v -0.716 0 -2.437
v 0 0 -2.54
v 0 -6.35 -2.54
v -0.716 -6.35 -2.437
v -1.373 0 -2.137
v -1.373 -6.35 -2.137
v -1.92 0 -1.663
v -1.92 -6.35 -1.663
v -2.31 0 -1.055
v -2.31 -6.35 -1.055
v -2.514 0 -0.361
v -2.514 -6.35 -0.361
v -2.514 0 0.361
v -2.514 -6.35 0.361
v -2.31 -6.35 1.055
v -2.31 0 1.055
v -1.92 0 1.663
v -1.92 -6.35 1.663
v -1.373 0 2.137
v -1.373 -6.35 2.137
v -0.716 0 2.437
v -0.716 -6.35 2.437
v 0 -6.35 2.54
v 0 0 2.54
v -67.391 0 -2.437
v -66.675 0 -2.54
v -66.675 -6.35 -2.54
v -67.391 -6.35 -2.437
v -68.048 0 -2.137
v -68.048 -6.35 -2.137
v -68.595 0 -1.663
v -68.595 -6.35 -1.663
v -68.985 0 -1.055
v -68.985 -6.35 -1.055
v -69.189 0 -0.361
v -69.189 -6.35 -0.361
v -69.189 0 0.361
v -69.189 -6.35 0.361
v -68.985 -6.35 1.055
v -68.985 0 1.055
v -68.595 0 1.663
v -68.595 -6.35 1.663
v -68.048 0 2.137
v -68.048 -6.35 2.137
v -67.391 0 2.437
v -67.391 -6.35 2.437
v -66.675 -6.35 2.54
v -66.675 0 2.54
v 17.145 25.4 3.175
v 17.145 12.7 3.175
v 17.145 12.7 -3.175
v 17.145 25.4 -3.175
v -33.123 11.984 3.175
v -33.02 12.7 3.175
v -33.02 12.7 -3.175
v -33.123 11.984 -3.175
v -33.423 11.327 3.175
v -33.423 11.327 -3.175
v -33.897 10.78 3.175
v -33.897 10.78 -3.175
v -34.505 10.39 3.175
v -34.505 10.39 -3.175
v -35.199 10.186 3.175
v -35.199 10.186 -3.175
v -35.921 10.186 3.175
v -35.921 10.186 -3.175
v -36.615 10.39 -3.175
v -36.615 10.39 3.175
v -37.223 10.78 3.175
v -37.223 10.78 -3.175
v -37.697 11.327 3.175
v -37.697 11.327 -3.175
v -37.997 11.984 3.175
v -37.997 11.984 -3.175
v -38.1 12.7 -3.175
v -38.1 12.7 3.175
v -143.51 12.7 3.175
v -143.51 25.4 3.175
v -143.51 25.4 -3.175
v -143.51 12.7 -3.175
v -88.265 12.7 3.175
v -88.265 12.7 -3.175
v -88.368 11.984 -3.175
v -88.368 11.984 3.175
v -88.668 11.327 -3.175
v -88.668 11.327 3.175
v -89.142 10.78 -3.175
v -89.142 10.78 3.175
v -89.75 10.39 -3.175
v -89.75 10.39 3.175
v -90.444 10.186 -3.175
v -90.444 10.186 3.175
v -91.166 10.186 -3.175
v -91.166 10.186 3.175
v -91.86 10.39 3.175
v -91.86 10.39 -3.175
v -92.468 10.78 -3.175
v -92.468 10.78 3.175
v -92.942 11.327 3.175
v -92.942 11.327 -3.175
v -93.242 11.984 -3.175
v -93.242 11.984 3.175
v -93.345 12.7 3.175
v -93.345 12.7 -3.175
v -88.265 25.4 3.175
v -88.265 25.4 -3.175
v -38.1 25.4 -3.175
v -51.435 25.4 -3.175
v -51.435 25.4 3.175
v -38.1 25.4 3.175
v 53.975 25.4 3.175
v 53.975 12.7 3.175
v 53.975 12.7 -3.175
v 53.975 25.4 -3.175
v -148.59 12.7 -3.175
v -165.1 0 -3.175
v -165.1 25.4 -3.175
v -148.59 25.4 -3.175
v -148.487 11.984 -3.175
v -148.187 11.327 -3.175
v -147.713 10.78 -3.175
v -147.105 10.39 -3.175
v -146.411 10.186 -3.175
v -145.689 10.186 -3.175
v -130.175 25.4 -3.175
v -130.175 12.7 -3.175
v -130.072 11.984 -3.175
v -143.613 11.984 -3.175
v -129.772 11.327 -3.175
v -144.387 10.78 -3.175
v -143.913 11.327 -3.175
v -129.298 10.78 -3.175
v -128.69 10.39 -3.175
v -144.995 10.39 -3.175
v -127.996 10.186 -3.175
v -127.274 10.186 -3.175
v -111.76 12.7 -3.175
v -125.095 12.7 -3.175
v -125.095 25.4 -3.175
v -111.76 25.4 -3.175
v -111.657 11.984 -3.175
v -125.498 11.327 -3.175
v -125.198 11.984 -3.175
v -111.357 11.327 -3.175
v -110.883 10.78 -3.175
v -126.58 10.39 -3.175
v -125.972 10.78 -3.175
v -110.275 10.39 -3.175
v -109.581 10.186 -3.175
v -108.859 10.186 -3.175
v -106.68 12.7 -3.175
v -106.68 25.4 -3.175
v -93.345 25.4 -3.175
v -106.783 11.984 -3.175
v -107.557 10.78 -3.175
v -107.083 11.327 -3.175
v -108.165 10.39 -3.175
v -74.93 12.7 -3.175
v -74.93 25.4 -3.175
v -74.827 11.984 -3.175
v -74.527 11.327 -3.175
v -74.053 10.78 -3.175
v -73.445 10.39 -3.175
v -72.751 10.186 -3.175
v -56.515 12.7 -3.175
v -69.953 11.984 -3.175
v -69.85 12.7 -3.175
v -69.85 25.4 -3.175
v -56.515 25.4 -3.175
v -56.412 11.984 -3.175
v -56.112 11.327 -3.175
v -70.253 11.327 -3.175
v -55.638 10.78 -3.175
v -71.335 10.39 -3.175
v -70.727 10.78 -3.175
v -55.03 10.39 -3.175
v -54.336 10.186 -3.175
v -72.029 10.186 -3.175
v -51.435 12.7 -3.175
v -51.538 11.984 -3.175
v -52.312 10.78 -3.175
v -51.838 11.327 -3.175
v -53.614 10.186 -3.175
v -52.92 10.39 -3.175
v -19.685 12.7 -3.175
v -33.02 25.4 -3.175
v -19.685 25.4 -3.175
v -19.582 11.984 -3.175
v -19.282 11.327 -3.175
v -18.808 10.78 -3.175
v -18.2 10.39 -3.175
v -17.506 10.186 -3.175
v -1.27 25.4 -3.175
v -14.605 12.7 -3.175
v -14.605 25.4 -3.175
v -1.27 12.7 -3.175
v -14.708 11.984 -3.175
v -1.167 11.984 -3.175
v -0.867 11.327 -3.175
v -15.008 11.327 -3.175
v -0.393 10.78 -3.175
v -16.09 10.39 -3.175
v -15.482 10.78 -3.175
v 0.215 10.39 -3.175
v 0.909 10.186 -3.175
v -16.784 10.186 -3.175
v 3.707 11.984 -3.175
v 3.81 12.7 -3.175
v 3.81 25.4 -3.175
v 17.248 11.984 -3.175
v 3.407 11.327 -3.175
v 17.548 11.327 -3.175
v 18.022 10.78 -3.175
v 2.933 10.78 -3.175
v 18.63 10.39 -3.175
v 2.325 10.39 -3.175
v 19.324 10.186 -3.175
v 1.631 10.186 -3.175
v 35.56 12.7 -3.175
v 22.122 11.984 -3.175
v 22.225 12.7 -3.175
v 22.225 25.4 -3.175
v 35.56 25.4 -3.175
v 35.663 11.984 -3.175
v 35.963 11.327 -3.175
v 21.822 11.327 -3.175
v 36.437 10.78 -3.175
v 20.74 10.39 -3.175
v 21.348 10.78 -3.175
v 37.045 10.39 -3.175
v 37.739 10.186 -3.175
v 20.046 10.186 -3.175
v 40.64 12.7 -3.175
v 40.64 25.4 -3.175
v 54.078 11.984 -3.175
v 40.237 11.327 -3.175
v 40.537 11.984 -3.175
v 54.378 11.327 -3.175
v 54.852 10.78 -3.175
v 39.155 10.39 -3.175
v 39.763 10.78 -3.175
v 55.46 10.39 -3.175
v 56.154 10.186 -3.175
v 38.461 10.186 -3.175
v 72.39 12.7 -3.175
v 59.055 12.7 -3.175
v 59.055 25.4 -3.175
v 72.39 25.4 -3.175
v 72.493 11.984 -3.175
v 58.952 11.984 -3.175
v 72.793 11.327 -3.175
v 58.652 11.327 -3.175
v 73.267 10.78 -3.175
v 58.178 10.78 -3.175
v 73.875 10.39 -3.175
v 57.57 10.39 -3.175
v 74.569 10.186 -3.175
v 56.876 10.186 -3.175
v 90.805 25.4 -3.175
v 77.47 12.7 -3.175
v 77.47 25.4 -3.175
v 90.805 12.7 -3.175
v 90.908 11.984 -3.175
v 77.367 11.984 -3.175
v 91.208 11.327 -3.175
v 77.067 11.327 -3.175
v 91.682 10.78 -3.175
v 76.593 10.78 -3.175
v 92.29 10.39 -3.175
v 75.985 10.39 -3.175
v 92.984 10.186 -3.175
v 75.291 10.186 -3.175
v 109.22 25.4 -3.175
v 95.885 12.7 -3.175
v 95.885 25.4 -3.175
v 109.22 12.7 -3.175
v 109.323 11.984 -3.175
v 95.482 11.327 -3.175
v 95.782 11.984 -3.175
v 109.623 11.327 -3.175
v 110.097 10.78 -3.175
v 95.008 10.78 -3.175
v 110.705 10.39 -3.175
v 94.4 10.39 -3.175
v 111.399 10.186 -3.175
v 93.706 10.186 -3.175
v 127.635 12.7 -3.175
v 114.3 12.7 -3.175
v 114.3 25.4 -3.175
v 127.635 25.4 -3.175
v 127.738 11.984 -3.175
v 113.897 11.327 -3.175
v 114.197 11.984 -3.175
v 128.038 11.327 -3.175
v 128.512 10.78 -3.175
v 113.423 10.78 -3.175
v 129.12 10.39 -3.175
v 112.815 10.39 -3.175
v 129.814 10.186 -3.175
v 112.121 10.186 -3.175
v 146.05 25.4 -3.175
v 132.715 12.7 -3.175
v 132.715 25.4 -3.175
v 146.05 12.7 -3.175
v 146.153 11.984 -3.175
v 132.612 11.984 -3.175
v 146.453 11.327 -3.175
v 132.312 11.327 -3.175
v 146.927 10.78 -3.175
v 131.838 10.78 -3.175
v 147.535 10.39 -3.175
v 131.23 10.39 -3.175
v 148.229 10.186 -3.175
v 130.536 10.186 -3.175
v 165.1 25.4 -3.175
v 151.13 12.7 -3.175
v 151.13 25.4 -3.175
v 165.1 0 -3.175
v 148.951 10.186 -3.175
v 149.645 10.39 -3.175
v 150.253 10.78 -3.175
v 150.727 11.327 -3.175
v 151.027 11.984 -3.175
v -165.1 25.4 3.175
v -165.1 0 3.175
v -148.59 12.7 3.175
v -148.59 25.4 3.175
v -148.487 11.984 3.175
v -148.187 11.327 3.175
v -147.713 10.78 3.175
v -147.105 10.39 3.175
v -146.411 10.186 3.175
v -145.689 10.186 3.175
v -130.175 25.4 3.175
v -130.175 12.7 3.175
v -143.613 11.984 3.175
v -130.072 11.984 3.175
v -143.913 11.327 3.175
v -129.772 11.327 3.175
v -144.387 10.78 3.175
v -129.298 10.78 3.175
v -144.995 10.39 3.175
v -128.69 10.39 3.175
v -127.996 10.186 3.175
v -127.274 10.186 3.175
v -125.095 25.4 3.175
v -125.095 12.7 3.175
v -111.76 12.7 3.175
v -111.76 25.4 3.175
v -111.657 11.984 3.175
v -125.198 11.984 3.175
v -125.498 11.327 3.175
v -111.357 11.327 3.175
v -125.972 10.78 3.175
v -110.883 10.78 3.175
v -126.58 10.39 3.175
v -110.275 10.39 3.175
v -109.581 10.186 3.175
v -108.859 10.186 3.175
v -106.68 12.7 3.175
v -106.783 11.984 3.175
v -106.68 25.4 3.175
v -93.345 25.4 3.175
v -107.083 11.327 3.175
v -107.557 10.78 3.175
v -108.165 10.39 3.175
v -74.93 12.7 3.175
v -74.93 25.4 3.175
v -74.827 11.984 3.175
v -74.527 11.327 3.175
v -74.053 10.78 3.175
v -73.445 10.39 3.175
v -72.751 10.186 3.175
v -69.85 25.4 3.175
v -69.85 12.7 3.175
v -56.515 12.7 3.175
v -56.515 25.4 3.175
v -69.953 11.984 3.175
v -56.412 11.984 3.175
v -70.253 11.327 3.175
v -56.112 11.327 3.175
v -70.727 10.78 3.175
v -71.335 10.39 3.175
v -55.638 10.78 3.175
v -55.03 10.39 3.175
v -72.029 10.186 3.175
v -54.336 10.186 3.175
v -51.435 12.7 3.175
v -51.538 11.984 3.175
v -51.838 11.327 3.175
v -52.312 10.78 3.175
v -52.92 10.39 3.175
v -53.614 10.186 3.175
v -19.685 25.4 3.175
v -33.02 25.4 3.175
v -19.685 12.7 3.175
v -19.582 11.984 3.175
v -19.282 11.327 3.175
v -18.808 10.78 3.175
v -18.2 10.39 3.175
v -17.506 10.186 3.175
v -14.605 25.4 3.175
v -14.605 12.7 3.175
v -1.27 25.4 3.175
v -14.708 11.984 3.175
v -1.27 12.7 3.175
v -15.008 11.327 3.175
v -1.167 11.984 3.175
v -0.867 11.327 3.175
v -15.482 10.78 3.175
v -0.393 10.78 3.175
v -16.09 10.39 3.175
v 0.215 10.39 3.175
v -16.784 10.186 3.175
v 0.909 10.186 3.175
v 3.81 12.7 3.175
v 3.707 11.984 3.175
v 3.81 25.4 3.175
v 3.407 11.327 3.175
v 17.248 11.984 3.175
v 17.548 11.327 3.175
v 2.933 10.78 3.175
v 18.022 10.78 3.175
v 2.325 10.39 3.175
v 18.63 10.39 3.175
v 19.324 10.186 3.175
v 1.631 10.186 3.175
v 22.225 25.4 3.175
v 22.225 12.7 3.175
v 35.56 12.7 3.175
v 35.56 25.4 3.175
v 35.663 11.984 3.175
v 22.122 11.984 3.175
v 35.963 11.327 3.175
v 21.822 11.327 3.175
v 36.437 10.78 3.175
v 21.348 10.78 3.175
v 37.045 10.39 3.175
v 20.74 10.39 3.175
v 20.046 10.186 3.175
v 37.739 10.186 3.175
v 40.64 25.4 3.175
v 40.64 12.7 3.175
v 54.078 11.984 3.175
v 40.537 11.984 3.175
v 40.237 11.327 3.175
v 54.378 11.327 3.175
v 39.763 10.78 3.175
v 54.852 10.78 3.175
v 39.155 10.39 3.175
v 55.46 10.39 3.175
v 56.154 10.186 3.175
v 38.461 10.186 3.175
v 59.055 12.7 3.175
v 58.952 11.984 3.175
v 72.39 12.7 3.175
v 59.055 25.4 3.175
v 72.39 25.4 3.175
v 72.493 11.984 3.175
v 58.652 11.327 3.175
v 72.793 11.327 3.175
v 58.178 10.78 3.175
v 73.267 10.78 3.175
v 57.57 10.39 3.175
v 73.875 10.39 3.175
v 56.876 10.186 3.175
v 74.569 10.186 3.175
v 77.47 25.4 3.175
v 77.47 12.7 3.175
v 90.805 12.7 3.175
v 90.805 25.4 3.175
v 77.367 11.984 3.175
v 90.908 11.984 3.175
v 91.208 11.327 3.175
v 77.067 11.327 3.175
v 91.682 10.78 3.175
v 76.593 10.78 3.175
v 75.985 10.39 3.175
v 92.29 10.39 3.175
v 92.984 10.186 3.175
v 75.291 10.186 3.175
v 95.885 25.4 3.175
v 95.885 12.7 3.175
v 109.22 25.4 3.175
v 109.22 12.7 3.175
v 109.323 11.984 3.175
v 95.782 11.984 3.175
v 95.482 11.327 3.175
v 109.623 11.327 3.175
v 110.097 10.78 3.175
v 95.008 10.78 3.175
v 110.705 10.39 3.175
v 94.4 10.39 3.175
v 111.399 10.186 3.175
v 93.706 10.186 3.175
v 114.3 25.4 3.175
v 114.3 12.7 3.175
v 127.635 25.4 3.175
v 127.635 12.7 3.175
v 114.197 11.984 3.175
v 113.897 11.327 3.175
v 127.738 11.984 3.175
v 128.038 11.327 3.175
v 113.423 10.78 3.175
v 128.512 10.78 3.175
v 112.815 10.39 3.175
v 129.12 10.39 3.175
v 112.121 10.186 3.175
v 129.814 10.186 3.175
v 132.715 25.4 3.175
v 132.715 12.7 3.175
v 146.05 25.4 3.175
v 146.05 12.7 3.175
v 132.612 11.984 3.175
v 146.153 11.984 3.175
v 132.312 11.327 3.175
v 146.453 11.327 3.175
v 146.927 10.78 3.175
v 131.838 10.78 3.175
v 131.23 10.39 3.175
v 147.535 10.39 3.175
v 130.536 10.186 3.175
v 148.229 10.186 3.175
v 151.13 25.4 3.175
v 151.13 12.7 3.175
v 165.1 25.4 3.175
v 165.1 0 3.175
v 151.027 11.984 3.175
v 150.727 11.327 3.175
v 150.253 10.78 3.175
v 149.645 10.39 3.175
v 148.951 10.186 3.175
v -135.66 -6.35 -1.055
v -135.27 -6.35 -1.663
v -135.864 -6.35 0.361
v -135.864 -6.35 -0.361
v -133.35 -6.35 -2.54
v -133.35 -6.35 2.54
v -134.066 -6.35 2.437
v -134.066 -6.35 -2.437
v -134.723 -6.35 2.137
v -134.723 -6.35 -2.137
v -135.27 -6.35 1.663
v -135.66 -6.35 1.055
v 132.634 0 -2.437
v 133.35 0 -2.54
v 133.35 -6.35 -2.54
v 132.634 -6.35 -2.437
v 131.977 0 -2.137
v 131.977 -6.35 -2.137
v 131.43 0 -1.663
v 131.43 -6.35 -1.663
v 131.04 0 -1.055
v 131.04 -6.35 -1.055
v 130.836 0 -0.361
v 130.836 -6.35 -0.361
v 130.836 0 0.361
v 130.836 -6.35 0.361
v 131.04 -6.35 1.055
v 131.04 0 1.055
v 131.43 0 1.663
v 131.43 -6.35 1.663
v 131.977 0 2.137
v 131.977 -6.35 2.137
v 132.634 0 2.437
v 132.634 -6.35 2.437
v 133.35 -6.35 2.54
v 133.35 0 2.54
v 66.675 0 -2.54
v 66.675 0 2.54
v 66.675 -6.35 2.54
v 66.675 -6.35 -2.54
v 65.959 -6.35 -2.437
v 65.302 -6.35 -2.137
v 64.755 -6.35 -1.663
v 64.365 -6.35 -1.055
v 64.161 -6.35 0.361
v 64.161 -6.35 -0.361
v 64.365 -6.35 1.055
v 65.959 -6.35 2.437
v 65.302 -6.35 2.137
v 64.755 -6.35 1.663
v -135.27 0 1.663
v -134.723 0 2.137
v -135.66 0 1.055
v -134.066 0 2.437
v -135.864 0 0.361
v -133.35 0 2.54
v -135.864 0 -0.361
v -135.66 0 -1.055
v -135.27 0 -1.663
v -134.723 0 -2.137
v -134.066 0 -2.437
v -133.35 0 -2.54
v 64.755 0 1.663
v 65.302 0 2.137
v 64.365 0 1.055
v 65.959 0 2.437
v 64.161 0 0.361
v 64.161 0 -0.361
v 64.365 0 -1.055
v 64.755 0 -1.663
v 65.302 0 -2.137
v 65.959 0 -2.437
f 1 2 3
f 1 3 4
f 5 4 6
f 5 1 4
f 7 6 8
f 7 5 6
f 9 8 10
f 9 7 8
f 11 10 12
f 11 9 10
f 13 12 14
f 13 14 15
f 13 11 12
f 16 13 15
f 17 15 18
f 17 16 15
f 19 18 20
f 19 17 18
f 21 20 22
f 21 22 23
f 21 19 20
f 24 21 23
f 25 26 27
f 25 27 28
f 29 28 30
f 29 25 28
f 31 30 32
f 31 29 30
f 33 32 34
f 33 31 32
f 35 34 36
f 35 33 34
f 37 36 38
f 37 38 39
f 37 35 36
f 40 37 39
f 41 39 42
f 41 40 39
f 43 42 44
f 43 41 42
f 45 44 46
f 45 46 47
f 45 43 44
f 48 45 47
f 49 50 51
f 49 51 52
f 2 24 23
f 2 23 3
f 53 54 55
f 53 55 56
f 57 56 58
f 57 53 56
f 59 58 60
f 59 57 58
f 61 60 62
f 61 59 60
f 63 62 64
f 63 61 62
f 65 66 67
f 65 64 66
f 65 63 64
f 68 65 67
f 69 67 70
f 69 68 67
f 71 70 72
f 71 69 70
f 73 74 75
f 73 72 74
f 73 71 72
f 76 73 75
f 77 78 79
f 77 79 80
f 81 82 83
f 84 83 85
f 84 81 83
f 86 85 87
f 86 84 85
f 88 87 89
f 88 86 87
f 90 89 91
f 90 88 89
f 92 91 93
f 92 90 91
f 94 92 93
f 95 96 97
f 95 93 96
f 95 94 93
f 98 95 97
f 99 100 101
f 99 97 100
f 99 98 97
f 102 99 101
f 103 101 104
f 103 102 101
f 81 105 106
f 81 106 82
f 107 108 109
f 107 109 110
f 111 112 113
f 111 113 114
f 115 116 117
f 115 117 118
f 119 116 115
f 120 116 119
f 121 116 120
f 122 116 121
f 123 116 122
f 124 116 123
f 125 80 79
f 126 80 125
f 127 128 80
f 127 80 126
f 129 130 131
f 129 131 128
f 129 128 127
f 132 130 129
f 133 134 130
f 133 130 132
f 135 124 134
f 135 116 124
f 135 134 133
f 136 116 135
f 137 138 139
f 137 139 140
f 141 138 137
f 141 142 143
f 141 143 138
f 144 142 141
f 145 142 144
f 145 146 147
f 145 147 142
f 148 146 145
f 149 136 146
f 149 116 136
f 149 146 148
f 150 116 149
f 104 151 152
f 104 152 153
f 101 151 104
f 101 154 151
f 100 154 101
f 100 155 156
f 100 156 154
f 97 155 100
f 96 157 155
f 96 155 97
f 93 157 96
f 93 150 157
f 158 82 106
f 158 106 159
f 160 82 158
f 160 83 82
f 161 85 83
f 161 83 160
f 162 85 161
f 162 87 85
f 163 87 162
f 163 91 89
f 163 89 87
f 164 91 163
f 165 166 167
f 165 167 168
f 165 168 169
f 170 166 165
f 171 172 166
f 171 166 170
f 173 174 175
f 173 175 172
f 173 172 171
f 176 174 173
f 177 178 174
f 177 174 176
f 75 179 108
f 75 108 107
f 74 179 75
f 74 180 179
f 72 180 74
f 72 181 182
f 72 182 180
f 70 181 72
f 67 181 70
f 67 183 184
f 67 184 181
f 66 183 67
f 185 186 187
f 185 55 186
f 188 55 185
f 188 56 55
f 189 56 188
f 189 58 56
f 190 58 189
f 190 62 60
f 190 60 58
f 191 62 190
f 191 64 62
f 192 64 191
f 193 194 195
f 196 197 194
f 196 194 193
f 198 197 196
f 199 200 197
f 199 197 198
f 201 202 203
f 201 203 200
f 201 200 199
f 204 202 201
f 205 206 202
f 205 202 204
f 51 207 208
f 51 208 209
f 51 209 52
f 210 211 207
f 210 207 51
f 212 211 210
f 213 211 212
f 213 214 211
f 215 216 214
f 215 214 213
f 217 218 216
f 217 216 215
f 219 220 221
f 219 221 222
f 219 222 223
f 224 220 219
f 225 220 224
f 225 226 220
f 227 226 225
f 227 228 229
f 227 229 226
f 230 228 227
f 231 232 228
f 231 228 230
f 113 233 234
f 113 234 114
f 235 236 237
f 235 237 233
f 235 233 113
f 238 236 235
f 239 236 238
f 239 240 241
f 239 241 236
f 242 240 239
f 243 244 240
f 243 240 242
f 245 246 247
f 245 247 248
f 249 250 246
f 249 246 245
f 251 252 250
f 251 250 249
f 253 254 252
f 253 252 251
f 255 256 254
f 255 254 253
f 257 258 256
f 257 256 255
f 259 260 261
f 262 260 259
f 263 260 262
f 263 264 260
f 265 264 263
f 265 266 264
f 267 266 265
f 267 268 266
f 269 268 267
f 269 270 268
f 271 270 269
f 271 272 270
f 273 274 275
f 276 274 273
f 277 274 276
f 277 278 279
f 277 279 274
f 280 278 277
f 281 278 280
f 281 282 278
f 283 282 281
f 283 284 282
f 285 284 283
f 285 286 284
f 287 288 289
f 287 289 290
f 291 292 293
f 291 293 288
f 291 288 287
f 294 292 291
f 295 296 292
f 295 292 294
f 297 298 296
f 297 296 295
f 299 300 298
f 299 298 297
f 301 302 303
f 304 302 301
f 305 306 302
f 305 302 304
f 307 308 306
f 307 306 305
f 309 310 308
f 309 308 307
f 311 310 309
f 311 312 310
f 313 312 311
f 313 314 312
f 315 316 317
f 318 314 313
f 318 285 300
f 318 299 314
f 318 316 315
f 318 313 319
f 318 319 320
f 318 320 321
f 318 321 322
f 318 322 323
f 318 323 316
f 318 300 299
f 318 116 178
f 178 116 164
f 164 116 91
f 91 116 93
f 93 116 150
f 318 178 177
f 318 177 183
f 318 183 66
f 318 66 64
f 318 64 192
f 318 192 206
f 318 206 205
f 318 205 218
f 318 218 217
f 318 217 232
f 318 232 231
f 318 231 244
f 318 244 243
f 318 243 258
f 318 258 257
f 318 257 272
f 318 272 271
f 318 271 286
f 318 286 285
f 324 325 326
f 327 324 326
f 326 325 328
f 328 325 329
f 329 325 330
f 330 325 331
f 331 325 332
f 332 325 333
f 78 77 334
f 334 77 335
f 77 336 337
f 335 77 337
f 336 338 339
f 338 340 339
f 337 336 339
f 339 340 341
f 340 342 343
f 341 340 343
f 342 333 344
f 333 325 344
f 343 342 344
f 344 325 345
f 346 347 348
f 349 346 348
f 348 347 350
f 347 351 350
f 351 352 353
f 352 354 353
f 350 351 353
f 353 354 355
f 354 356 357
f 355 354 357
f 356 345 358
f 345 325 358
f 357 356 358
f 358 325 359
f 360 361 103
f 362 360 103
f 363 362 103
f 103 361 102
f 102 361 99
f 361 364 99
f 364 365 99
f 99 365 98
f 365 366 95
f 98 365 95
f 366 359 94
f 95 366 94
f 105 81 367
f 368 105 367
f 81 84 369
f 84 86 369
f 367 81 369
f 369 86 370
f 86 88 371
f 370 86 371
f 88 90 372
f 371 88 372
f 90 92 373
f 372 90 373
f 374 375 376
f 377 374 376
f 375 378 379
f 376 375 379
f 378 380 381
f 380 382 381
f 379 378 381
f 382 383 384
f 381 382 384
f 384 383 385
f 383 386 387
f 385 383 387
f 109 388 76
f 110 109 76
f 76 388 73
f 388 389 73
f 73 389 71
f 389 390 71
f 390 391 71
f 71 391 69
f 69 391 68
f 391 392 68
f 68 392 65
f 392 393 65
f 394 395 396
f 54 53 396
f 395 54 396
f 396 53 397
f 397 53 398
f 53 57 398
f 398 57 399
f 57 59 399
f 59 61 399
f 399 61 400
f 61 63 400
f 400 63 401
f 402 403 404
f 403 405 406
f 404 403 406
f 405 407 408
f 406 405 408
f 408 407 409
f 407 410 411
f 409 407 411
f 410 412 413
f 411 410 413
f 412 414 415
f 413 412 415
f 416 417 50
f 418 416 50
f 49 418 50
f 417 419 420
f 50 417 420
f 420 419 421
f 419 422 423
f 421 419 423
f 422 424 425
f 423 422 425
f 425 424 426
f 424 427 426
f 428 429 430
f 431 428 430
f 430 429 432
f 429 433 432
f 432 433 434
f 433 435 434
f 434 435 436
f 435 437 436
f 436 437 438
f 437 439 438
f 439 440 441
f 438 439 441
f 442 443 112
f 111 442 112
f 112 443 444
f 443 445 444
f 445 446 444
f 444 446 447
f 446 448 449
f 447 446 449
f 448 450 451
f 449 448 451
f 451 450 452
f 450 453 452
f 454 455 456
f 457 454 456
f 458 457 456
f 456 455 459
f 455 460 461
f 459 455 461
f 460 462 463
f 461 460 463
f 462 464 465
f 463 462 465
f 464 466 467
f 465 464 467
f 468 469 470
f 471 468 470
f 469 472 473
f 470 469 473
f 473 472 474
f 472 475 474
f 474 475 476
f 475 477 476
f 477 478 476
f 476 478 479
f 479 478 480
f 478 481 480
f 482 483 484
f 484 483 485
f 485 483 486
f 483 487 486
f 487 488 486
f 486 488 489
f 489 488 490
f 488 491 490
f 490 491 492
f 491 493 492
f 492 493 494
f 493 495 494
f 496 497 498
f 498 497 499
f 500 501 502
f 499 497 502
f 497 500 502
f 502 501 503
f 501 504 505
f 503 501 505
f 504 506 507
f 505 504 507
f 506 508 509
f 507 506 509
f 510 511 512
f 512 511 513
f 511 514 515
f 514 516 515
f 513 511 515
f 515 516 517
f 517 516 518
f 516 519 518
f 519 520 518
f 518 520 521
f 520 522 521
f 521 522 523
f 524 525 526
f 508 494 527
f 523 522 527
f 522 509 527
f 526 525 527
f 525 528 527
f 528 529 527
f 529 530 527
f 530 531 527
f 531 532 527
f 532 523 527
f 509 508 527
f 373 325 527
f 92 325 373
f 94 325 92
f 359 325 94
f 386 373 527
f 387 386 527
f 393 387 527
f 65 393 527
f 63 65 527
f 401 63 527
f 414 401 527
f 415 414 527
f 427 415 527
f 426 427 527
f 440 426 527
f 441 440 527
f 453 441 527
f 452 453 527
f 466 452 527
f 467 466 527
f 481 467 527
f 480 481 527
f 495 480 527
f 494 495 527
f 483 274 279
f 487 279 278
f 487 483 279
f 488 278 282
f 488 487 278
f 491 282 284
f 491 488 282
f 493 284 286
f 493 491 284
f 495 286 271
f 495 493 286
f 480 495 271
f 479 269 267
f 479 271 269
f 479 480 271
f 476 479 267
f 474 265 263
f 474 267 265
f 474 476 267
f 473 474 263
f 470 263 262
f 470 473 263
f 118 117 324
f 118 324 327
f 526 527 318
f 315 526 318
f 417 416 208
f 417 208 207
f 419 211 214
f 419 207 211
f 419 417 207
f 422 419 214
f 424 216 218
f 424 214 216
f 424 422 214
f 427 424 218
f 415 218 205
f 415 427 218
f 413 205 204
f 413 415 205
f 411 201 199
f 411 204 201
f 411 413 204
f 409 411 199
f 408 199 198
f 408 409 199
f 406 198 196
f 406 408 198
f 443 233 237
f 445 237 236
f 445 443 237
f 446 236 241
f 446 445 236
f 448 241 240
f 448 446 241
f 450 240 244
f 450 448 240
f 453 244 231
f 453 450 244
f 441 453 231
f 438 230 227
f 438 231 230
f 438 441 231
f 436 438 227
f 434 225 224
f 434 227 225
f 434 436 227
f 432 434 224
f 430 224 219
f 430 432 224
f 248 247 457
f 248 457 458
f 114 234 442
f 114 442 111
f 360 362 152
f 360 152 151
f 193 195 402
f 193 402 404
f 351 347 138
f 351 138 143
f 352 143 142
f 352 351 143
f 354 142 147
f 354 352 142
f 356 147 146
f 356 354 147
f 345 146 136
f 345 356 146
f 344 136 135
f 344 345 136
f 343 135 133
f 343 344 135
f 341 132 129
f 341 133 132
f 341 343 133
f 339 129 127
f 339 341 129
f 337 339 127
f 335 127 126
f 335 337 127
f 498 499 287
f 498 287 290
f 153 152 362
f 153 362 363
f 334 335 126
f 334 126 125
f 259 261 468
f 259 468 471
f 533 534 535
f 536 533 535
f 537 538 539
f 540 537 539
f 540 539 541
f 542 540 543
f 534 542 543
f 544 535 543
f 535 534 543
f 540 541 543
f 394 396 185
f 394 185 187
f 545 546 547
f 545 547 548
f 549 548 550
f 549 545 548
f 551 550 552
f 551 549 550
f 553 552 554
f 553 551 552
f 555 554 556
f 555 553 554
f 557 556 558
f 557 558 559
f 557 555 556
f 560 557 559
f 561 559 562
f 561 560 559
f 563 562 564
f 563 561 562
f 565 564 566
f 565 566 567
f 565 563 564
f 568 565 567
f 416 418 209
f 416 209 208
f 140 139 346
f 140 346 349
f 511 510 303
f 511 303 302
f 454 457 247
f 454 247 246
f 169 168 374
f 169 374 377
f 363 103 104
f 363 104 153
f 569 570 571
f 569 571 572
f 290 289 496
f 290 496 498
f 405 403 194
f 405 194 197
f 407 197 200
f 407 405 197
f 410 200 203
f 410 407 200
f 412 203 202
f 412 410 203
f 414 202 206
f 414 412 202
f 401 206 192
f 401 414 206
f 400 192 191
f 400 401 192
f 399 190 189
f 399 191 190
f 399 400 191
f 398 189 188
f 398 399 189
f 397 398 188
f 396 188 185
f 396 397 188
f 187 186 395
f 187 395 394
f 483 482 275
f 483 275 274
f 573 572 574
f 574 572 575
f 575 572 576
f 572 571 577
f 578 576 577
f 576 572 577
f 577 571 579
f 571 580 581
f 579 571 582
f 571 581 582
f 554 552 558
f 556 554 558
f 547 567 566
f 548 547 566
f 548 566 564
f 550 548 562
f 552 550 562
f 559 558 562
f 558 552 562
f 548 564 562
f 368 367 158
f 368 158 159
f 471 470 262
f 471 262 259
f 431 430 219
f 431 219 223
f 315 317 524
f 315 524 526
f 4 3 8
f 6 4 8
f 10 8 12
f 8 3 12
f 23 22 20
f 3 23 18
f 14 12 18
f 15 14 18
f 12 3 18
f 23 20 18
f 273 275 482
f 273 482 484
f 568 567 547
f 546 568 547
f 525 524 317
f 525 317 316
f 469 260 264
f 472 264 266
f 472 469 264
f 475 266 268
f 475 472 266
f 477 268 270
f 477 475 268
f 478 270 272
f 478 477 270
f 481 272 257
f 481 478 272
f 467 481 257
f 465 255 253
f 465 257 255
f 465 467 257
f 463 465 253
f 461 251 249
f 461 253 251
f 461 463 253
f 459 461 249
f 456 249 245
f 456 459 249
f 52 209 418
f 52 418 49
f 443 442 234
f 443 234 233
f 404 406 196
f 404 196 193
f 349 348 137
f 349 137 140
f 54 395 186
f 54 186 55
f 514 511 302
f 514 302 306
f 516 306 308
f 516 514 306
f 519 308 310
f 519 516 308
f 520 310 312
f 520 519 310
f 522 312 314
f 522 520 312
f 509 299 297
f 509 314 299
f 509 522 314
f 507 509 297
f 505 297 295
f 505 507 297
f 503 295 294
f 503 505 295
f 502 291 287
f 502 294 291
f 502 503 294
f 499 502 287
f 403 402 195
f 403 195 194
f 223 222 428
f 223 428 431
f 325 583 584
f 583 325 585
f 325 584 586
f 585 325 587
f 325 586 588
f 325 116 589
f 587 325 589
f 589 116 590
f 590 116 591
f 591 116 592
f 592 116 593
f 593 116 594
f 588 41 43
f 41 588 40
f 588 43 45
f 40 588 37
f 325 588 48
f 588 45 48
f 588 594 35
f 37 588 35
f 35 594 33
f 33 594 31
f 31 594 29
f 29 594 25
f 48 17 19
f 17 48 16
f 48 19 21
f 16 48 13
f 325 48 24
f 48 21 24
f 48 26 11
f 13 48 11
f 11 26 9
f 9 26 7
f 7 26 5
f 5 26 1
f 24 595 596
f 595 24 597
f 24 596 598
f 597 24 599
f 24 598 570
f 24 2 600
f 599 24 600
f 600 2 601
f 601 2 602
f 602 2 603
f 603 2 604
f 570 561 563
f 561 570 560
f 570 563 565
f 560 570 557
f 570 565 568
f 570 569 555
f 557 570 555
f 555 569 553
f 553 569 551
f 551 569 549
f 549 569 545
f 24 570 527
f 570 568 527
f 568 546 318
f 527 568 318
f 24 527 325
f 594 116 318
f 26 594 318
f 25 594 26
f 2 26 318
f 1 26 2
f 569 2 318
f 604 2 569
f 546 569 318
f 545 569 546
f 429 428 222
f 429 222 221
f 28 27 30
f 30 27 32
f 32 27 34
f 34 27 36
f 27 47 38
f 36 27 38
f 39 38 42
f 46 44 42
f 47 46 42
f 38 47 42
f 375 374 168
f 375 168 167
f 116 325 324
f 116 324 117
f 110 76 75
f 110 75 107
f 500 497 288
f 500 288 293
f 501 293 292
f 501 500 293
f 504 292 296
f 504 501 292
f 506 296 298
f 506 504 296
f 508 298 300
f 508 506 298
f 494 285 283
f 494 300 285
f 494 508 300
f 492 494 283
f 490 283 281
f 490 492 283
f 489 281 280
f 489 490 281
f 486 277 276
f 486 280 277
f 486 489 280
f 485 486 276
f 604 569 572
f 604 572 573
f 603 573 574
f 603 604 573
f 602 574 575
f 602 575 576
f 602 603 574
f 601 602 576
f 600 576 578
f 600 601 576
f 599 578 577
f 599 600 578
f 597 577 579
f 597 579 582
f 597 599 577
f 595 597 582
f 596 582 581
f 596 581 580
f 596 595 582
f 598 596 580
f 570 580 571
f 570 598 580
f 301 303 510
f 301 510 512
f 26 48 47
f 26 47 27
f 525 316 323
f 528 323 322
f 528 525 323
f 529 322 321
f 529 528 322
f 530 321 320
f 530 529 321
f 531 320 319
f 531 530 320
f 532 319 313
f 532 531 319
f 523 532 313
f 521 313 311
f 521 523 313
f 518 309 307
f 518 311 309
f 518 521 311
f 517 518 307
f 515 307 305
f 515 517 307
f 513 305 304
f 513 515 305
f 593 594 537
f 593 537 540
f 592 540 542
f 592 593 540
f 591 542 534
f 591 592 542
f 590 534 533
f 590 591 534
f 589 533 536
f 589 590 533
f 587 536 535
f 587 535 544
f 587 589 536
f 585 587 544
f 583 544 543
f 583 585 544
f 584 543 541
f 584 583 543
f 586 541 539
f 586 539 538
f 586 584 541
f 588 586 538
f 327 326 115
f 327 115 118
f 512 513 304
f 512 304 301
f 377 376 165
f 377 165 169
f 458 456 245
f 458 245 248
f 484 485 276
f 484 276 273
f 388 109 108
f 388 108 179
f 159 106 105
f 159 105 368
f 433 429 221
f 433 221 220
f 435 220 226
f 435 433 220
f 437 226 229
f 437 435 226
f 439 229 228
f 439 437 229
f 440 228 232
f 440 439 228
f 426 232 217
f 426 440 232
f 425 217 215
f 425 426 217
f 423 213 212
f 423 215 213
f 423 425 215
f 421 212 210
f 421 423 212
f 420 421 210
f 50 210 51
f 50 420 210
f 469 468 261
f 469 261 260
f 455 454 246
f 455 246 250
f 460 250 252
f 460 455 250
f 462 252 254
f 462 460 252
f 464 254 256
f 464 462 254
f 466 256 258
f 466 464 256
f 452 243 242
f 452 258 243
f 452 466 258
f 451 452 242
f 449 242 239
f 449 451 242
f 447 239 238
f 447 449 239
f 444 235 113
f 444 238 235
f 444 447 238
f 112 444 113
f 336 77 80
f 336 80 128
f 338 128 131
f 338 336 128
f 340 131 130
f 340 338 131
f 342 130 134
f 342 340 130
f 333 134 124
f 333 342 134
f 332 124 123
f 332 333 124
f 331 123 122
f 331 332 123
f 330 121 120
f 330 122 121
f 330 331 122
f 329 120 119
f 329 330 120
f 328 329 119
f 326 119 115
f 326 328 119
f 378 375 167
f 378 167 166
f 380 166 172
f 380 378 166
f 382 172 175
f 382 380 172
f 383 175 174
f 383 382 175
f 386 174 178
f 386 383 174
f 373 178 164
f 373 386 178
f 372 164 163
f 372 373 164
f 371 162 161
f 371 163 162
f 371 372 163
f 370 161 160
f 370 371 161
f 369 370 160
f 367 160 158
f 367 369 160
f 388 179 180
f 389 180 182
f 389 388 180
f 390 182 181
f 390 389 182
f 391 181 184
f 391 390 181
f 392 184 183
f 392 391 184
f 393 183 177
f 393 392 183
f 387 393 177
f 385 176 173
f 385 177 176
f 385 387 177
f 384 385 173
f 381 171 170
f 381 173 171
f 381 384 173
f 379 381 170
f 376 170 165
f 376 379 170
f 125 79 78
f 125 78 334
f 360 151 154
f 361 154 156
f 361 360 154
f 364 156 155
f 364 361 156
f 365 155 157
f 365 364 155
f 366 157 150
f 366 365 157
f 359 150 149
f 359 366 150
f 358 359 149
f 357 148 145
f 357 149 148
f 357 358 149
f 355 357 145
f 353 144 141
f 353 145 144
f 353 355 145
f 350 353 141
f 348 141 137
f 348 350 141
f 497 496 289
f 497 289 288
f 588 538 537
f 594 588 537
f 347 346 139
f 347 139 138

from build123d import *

# Parameters (mm, degrees)
SKETCH1_W           = 330.2
SKETCH1_H           = 6.35
BOSS_EXTRUDE1_DEPTH = 25.4
BOSS_EXTRUDE2_DEPTH = 6.35
CUT_EXTRUDE1_DEPTH  = 168.16307158


with BuildPart() as part:
    # Sketch1 → Boss-Extrude1 (new body)
    with BuildSketch(Plane(origin=(0, 0, 0), x_dir=(1, 0, 0), z_dir=(0, 1, 0))):
        Rectangle(SKETCH1_W, SKETCH1_H)
    extrude(amount=BOSS_EXTRUDE1_DEPTH)

    # Sketch2 → Boss-Extrude2 (add)
    with BuildSketch(Plane.XZ):
        with BuildLine():
            Line((-133.35, 2.54), (-133.35, -2.54))
            ThreePointArc((-133.35, -2.54), (-135.89, 0), (-133.35, 2.54))
        make_face()
        with BuildLine():
            Line((-66.675, 2.54), (-66.675, -2.54))
            ThreePointArc((-66.675, -2.54), (-69.215, 0), (-66.675, 2.54))
        make_face()
        with BuildLine():
            Line((0, 2.54), (0, -2.54))
            ThreePointArc((0, -2.54), (-2.54, 0), (0, 2.54))
        make_face()
        with BuildLine():
            Line((66.675, 2.54), (66.675, -2.54))
            ThreePointArc((66.675, -2.54), (64.135, 0), (66.675, 2.54))
        make_face()
        with BuildLine():
            Line((133.35, 2.54), (133.35, -2.54))
            ThreePointArc((133.35, -2.54), (130.81, 0), (133.35, 2.54))
        make_face()
    extrude(amount=BOSS_EXTRUDE2_DEPTH)

    # Sketch3 → Cut-Extrude1 (cut, through all)
    with BuildSketch(Plane.XY.offset(3.175)):
        with BuildLine():
            Line((-143.51, 38.1), (-143.51, 12.7))
            ThreePointArc((-143.51, 12.7), (-146.05, 10.16), (-148.59, 12.7))
            Line((-148.59, 12.7), (-148.59, 38.1))
            ThreePointArc((-148.59, 38.1), (-146.05, 40.64), (-143.51, 38.1))
        make_face()
        with BuildLine():
            Line((-125.095, 38.1), (-125.095, 12.7))
            ThreePointArc((-125.095, 12.7), (-127.635, 10.16), (-130.175, 12.7))
            Line((-130.175, 12.7), (-130.175, 38.1))
            ThreePointArc((-130.175, 38.1), (-127.635, 40.64), (-125.095, 38.1))
        make_face()
        with BuildLine():
            Line((-106.68, 38.1), (-106.68, 12.7))
            ThreePointArc((-106.68, 12.7), (-109.22, 10.16), (-111.76, 12.7))
            Line((-111.76, 12.7), (-111.76, 38.1))
            ThreePointArc((-111.76, 38.1), (-109.22, 40.64), (-106.68, 38.1))
        make_face()
        with BuildLine():
            Line((-88.265, 38.1), (-88.265, 12.7))
            ThreePointArc((-88.265, 12.7), (-90.805, 10.16), (-93.345, 12.7))
            Line((-93.345, 12.7), (-93.345, 38.1))
            ThreePointArc((-93.345, 38.1), (-90.805, 40.64), (-88.265, 38.1))
        make_face()
        with BuildLine():
            Line((-69.85, 38.1), (-69.85, 12.7))
            ThreePointArc((-69.85, 12.7), (-72.39, 10.16), (-74.93, 12.7))
            Line((-74.93, 12.7), (-74.93, 38.1))
            ThreePointArc((-74.93, 38.1), (-72.39, 40.64), (-69.85, 38.1))
        make_face()
        with BuildLine():
            Line((-51.435, 38.1), (-51.435, 12.7))
            ThreePointArc((-51.435, 12.7), (-53.975, 10.16), (-56.515, 12.7))
            Line((-56.515, 12.7), (-56.515, 38.1))
            ThreePointArc((-56.515, 38.1), (-53.975, 40.64), (-51.435, 38.1))
        make_face()
        with BuildLine():
            Line((-33.02, 38.1), (-33.02, 12.7))
            ThreePointArc((-33.02, 12.7), (-35.56, 10.16), (-38.1, 12.7))
            Line((-38.1, 12.7), (-38.1, 38.1))
            ThreePointArc((-38.1, 38.1), (-35.56, 40.64), (-33.02, 38.1))
        make_face()
        with BuildLine():
            Line((-14.605, 38.1), (-14.605, 12.7))
            ThreePointArc((-14.605, 12.7), (-17.145, 10.16), (-19.685, 12.7))
            Line((-19.685, 12.7), (-19.685, 38.1))
            ThreePointArc((-19.685, 38.1), (-17.145, 40.64), (-14.605, 38.1))
        make_face()
        with BuildLine():
            Line((3.81, 38.1), (3.81, 12.7))
            ThreePointArc((3.81, 12.7), (1.27, 10.16), (-1.27, 12.7))
            Line((-1.27, 12.7), (-1.27, 38.1))
            ThreePointArc((-1.27, 38.1), (1.27, 40.64), (3.81, 38.1))
        make_face()
        with BuildLine():
            Line((22.225, 38.1), (22.225, 12.7))
            ThreePointArc((22.225, 12.7), (19.685, 10.16), (17.145, 12.7))
            Line((17.145, 12.7), (17.145, 38.1))
            ThreePointArc((17.145, 38.1), (19.685, 40.64), (22.225, 38.1))
        make_face()
        with BuildLine():
            Line((40.64, 38.1), (40.64, 12.7))
            ThreePointArc((40.64, 12.7), (38.1, 10.16), (35.56, 12.7))
            Line((35.56, 12.7), (35.56, 38.1))
            ThreePointArc((35.56, 38.1), (38.1, 40.64), (40.64, 38.1))
        make_face()
        with BuildLine():
            Line((59.055, 38.1), (59.055, 12.7))
            ThreePointArc((59.055, 12.7), (56.515, 10.16), (53.975, 12.7))
            Line((53.975, 12.7), (53.975, 38.1))
            ThreePointArc((53.975, 38.1), (56.515, 40.64), (59.055, 38.1))
        make_face()
        with BuildLine():
            Line((77.47, 38.1), (77.47, 12.7))
            ThreePointArc((77.47, 12.7), (74.93, 10.16), (72.39, 12.7))
            Line((72.39, 12.7), (72.39, 38.1))
            ThreePointArc((72.39, 38.1), (74.93, 40.64), (77.47, 38.1))
        make_face()
        with BuildLine():
            Line((95.885, 38.1), (95.885, 12.7))
            ThreePointArc((95.885, 12.7), (93.345, 10.16), (90.805, 12.7))
            Line((90.805, 12.7), (90.805, 38.1))
            ThreePointArc((90.805, 38.1), (93.345, 40.64), (95.885, 38.1))
        make_face()
        with BuildLine():
            Line((114.3, 38.1), (114.3, 12.7))
            ThreePointArc((114.3, 12.7), (111.76, 10.16), (109.22, 12.7))
            Line((109.22, 12.7), (109.22, 38.1))
            ThreePointArc((109.22, 38.1), (111.76, 40.64), (114.3, 38.1))
        make_face()
        with BuildLine():
            Line((132.715, 38.1), (132.715, 12.7))
            ThreePointArc((132.715, 12.7), (130.175, 10.16), (127.635, 12.7))
            Line((127.635, 12.7), (127.635, 38.1))
            ThreePointArc((127.635, 38.1), (130.175, 40.64), (132.715, 38.1))
        make_face()
        with BuildLine():
            Line((151.13, 38.1), (151.13, 12.7))
            ThreePointArc((151.13, 12.7), (148.59, 10.16), (146.05, 12.7))
            Line((146.05, 12.7), (146.05, 38.1))
            ThreePointArc((146.05, 38.1), (148.59, 40.64), (151.13, 38.1))
        make_face()
    extrude(amount=-CUT_EXTRUDE1_DEPTH, mode=Mode.SUBTRACT)


solid = part.part
